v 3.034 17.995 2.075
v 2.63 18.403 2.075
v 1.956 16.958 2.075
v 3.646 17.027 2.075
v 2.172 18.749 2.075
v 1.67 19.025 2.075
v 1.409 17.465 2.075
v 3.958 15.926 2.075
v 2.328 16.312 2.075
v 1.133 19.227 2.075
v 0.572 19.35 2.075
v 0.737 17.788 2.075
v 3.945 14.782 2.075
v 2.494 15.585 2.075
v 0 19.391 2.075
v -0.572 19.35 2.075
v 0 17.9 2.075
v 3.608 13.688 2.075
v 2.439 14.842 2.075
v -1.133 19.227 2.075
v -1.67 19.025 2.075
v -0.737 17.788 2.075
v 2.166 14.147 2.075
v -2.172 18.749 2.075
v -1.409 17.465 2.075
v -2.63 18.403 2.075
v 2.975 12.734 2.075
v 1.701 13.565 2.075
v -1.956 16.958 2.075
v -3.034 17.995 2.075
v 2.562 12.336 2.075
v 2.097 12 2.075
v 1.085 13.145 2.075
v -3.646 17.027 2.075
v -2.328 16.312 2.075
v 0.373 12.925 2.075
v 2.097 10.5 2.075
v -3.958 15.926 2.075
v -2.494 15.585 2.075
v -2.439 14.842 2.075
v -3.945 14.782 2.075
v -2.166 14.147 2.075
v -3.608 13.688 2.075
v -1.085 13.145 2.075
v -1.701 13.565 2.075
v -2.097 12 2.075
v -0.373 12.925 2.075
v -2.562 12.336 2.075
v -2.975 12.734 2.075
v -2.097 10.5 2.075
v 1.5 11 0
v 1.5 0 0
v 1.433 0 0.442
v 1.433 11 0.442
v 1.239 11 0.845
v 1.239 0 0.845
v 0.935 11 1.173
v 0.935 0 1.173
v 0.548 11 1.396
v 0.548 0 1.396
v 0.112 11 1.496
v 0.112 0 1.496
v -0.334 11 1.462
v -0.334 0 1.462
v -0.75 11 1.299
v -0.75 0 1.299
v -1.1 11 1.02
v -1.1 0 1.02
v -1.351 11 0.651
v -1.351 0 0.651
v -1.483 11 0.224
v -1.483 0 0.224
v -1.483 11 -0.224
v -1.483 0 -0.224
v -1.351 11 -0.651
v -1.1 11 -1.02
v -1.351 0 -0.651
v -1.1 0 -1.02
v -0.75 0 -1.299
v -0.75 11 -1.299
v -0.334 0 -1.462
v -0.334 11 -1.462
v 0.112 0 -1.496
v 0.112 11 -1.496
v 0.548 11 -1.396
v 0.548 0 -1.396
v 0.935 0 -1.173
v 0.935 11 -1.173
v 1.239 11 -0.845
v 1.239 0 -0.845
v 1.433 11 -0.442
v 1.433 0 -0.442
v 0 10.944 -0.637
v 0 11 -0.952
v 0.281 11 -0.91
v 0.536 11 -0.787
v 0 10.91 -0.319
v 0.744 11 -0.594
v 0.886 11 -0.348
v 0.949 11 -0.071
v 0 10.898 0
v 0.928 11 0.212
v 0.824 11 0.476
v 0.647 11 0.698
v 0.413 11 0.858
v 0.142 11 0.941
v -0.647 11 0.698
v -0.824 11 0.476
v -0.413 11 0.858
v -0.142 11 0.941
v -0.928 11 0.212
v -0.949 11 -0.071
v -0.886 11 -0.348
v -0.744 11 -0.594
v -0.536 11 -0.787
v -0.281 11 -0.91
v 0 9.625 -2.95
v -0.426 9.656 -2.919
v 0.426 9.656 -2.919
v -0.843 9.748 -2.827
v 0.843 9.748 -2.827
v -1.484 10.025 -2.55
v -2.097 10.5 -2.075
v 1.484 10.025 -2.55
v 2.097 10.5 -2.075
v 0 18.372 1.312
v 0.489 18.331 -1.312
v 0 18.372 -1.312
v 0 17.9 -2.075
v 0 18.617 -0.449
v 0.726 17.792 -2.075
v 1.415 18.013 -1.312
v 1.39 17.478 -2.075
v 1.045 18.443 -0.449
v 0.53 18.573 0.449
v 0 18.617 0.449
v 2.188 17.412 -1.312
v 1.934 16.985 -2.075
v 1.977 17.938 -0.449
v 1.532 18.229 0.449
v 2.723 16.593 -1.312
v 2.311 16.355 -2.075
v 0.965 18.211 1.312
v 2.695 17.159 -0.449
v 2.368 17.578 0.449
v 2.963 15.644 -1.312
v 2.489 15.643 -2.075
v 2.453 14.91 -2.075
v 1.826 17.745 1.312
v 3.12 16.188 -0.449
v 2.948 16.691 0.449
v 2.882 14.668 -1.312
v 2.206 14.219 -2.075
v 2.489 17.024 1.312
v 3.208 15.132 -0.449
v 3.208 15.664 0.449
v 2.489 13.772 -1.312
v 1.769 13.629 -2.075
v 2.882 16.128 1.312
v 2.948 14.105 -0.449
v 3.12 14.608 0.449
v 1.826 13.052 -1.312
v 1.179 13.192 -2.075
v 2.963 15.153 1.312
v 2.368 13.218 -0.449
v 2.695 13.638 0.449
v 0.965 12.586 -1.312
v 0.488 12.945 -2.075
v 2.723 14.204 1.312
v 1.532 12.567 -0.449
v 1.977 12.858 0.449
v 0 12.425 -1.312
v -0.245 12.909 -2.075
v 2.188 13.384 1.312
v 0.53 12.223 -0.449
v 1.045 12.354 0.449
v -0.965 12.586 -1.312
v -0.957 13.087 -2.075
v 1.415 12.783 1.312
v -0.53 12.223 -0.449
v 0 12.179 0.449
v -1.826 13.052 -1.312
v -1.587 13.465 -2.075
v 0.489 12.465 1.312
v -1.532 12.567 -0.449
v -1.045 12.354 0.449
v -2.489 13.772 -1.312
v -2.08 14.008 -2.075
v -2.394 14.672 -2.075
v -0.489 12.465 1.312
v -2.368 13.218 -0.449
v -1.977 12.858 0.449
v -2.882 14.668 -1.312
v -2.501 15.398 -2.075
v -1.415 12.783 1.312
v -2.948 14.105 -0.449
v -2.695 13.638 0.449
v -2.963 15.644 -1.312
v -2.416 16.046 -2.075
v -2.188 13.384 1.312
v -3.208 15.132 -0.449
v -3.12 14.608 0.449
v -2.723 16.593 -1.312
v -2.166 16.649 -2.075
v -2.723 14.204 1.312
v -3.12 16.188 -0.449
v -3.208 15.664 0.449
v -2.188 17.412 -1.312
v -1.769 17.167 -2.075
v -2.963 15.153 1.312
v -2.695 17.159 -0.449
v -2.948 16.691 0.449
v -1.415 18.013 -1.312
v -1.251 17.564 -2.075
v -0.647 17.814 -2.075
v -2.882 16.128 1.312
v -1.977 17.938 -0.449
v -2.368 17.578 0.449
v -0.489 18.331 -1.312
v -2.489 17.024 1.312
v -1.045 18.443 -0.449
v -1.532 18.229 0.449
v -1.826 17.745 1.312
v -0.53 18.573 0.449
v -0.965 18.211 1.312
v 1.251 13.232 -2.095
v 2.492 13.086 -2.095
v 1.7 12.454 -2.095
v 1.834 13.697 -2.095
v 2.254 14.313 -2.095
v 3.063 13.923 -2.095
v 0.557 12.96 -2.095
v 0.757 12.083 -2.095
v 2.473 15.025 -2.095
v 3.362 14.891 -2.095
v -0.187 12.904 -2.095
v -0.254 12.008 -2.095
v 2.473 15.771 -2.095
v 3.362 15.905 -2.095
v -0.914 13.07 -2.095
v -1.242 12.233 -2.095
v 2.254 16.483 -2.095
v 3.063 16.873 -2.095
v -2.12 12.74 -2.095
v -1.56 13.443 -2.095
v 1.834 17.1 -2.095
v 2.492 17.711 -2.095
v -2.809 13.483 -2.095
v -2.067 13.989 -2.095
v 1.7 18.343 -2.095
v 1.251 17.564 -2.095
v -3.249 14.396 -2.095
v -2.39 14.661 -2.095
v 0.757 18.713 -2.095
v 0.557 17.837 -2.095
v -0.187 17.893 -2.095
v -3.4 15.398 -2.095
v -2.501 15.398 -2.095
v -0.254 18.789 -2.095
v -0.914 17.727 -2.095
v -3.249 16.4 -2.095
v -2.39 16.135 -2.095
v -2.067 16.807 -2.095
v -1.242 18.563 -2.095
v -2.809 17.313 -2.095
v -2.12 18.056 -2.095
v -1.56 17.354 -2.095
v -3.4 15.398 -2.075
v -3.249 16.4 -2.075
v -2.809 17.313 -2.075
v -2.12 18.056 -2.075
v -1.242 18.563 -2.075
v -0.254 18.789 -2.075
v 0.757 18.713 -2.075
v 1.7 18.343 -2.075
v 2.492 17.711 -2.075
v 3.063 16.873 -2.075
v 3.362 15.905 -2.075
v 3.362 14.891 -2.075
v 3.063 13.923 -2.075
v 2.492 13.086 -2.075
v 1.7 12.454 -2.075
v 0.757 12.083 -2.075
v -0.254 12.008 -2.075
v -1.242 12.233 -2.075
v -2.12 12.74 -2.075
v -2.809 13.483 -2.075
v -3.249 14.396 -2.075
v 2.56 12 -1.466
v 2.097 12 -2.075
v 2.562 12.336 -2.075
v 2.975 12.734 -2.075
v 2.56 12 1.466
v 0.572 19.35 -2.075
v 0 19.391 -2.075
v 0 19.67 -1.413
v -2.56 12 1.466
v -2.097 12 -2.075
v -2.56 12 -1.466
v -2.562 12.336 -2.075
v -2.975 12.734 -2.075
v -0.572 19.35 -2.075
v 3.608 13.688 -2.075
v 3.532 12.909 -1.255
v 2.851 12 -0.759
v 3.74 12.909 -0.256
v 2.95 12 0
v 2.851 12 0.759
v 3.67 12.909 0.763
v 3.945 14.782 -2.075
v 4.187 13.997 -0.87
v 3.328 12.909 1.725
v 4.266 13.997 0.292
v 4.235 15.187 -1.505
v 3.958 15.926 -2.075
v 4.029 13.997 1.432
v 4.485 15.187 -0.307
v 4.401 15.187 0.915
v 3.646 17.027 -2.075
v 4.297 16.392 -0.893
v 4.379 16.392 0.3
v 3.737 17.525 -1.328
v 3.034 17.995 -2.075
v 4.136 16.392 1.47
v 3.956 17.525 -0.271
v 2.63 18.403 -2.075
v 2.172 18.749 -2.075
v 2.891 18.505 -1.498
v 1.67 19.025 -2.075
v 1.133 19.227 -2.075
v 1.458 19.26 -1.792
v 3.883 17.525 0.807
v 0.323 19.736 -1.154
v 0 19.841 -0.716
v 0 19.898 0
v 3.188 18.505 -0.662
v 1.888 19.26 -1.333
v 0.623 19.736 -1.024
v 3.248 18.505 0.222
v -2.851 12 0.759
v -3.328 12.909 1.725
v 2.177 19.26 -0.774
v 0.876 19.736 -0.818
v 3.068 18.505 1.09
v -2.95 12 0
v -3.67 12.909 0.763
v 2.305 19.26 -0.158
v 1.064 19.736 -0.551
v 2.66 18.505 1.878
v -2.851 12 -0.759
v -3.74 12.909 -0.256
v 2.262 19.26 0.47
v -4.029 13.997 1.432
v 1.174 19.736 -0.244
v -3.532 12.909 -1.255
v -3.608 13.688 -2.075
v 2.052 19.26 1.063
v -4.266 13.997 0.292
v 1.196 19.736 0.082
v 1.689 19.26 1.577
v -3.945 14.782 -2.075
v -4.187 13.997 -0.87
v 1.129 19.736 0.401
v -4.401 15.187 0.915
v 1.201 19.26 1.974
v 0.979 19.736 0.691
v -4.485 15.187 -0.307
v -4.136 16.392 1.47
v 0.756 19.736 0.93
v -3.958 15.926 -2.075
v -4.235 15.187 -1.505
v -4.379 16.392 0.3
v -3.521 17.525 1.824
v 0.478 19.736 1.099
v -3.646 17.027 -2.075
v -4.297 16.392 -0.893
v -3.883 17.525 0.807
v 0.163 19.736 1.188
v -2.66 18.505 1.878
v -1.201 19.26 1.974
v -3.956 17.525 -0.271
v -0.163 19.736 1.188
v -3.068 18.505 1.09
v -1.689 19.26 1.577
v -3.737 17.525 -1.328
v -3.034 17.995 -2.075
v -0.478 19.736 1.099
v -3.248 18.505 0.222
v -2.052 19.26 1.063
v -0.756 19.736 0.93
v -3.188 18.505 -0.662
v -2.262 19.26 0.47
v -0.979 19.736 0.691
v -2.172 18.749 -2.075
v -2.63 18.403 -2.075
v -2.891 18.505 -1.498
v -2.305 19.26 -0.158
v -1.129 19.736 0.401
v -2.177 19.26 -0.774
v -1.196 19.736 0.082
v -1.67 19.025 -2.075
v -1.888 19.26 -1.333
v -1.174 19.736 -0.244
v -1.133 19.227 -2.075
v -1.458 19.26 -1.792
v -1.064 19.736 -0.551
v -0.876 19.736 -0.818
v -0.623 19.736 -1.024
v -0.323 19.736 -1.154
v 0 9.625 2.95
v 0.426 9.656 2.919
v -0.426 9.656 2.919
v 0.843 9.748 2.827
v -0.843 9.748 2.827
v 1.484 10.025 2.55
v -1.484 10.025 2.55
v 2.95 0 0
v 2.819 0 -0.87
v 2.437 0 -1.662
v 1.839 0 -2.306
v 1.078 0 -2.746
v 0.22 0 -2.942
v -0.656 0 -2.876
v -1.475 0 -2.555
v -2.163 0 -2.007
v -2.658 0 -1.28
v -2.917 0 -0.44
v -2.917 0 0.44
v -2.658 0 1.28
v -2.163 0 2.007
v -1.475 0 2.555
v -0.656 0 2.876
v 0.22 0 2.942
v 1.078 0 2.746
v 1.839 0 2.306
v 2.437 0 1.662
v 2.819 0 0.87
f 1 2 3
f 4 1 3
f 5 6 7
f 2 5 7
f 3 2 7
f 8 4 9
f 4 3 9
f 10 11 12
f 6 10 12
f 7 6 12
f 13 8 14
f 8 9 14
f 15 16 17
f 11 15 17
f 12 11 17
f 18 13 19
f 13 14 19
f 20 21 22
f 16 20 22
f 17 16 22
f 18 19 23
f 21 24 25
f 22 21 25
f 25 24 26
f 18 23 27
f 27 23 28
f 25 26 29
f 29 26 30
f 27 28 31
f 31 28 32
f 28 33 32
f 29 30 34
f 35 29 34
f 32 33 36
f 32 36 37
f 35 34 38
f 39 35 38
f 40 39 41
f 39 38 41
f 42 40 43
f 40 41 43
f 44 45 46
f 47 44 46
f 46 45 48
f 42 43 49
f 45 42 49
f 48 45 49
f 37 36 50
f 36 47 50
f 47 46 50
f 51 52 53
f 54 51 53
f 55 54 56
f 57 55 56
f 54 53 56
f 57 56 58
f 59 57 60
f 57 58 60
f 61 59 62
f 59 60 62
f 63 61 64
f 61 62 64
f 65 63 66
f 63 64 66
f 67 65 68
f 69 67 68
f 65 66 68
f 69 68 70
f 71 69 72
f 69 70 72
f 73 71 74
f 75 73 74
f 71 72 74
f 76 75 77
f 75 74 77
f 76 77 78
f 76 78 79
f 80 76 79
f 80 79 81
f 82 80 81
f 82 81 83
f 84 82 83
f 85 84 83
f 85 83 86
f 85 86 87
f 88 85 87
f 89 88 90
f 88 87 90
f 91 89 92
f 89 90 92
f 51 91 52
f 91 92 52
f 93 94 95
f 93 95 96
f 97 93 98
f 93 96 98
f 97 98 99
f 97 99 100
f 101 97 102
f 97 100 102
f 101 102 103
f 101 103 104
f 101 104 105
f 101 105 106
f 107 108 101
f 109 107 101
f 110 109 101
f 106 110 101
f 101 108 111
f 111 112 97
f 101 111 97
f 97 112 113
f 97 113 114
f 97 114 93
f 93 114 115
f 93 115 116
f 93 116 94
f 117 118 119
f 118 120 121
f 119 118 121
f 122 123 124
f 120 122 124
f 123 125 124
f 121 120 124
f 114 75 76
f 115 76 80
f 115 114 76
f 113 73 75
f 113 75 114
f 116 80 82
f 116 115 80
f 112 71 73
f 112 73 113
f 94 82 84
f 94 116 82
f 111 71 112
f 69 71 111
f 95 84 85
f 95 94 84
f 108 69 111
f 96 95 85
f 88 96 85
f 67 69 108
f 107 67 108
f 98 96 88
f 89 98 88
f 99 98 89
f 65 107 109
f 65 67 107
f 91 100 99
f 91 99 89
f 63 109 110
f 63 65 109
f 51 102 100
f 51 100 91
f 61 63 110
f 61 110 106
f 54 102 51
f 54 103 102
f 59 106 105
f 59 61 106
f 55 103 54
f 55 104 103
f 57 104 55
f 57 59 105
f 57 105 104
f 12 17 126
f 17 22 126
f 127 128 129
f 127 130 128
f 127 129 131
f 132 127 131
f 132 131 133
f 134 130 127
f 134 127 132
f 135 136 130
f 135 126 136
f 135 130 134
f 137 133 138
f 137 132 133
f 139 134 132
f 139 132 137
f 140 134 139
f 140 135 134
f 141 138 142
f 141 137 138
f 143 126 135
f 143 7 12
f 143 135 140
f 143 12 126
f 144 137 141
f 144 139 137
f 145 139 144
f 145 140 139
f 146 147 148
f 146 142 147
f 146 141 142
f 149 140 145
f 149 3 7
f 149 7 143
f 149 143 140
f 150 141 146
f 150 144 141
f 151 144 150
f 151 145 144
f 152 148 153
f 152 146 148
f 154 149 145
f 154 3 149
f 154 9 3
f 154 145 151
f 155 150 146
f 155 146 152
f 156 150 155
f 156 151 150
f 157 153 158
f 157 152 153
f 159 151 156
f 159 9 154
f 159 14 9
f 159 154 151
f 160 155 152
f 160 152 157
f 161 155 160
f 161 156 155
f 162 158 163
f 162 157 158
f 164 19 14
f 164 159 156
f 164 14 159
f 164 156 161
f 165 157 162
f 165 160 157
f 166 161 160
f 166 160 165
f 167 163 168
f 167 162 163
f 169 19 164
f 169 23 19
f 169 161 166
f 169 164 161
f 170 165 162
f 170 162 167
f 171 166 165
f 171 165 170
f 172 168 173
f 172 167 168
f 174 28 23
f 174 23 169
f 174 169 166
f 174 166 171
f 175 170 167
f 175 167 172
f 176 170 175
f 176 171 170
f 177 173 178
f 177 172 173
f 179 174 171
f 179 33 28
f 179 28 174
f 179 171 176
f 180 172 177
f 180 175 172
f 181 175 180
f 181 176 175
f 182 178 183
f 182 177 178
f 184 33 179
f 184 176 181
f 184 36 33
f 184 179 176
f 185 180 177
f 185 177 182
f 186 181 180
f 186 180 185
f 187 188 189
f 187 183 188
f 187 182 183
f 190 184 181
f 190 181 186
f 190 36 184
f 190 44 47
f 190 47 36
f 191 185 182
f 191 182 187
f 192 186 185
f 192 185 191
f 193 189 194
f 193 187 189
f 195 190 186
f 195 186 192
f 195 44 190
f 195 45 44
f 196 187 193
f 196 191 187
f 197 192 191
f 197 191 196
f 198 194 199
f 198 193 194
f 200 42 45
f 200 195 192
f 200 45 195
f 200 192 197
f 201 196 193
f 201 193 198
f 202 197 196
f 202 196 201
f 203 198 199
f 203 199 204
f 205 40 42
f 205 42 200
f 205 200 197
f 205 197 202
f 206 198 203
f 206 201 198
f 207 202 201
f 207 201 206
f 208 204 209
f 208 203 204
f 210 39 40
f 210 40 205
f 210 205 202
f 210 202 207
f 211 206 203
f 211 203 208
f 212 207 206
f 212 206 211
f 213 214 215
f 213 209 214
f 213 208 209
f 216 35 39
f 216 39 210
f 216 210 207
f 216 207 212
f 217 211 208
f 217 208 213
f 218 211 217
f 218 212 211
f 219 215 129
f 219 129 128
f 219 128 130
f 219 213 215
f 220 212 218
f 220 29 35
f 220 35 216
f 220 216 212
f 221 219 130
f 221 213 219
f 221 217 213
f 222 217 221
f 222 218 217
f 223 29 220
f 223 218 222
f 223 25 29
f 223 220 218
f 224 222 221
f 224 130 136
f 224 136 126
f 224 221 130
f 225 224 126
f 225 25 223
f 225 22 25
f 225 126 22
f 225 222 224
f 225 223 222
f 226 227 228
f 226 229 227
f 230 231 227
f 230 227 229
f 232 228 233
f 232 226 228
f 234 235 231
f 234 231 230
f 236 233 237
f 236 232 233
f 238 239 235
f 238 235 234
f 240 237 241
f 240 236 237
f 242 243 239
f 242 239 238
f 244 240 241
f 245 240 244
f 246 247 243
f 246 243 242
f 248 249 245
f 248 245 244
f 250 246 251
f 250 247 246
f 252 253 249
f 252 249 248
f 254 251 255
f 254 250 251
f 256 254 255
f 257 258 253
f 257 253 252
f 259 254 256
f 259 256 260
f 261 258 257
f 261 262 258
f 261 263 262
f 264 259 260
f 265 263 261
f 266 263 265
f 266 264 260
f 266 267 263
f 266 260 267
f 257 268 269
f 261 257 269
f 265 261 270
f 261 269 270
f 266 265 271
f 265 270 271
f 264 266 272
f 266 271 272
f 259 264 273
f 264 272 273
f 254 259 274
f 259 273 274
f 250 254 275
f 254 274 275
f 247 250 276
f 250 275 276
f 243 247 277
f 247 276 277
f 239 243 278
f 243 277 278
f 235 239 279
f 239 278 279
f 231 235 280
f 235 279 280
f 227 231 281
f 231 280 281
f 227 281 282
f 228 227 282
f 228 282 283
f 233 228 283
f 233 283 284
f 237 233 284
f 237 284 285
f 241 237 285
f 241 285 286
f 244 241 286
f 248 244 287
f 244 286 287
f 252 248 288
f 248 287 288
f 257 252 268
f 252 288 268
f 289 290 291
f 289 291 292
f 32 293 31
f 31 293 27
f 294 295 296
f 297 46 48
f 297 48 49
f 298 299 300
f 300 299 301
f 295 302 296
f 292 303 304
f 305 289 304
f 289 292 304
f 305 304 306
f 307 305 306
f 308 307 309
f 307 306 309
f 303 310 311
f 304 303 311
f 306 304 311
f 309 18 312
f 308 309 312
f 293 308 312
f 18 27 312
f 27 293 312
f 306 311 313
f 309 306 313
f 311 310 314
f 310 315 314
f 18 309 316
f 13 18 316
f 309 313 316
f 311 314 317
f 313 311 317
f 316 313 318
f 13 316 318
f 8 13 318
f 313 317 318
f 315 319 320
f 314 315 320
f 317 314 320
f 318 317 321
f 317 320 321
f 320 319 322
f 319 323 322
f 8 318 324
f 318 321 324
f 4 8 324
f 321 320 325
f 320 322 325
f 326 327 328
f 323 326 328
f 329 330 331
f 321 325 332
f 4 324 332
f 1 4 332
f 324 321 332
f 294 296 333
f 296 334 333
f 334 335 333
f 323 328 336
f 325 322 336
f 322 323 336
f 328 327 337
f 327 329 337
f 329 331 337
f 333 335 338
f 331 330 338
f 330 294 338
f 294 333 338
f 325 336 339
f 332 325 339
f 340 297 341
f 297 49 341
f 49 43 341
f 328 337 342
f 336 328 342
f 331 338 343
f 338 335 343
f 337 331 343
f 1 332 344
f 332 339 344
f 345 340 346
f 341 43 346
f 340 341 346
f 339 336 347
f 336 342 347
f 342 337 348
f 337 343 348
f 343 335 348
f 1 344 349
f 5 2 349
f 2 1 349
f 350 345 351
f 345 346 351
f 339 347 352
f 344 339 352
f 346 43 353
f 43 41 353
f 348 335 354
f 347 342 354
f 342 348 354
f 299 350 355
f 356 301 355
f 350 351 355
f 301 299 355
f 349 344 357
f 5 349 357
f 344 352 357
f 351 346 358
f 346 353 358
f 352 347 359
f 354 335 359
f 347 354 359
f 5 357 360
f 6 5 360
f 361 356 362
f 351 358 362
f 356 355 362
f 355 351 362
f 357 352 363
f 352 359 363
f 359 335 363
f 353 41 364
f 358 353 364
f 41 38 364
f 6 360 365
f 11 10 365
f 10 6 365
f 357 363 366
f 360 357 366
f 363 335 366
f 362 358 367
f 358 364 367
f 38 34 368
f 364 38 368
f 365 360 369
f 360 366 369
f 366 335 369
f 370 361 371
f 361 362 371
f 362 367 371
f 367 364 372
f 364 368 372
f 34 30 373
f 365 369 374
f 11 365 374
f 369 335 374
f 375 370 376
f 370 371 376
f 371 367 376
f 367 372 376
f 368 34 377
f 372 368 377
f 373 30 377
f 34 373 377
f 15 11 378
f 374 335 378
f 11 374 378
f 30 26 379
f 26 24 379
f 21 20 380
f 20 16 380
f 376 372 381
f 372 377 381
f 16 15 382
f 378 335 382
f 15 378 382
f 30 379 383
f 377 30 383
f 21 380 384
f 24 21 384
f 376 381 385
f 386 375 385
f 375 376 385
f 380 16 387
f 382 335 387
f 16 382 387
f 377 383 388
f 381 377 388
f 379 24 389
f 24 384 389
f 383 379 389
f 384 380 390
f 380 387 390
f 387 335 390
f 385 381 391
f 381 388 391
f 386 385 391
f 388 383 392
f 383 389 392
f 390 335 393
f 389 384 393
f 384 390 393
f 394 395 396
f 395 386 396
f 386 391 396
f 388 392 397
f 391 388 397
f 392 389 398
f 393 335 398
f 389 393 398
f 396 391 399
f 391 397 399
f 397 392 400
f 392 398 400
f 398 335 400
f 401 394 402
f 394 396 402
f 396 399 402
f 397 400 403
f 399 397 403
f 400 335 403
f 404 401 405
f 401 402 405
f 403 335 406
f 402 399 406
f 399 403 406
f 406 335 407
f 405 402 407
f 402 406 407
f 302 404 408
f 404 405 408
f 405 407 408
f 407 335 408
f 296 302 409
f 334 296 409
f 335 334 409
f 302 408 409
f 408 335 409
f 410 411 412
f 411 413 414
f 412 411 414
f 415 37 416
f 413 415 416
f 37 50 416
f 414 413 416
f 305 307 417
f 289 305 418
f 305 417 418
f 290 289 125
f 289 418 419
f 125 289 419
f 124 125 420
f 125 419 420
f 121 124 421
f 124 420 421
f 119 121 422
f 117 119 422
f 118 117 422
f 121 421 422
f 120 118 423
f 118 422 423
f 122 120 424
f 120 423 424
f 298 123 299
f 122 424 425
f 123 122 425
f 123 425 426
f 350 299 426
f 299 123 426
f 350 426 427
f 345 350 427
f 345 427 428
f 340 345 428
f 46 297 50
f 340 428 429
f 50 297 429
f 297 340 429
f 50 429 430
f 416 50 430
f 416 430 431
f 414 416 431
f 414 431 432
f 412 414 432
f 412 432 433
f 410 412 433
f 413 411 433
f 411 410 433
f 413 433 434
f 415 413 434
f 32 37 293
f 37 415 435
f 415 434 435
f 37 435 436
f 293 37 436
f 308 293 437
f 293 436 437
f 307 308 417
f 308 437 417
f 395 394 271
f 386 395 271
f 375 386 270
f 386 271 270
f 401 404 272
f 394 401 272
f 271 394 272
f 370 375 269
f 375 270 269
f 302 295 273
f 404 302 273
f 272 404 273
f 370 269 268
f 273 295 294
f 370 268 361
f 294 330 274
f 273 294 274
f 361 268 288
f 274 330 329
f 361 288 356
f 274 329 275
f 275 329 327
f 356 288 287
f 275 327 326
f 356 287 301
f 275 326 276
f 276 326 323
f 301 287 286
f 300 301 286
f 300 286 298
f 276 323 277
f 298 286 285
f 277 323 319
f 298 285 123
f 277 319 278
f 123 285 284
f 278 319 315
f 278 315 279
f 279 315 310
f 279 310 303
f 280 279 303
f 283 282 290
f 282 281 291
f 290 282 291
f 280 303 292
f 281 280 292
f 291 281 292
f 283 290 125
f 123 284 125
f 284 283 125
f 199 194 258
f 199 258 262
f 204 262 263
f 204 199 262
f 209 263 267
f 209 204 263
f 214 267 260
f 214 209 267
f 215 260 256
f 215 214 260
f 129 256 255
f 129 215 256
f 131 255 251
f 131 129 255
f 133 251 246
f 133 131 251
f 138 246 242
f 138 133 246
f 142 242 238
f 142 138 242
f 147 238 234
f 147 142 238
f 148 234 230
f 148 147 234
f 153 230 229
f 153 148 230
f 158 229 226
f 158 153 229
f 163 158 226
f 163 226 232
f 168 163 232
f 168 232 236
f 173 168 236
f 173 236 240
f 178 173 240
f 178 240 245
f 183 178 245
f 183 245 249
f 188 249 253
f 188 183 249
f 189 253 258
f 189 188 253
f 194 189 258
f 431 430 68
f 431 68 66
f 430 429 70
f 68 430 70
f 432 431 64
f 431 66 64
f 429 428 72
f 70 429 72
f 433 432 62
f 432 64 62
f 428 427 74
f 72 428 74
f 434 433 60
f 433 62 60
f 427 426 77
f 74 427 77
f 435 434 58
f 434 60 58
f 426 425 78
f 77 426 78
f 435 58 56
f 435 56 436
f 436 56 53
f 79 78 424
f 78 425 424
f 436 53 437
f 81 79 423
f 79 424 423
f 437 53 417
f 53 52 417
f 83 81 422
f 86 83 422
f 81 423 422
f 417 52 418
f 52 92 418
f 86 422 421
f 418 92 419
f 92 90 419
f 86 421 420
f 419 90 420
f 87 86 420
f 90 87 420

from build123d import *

# Parameters (mm, degrees)
SKETCH1_R               = 2.95
BOSS_EXTRUDE1_DEPTH     = 12
SKETCH5_R               = 1.5
CUT_EXTRUDE3_DEPTH      = 11
CUT_EXTRUDE4_DEPTH      = 5.5
CUT_EXTRUDE4_DEPTH_BACK = 5.5
SKETCH12_R              = 3.400000058
SKETCH12_R_2            = 2.501374622
BOSS_EXTRUDE5_DEPTH     = 0.02


with BuildPart() as part:
    # Sketch1 → Boss-Extrude1 (new body)
    with BuildSketch(Plane(origin=(0, 0, 0), x_dir=(1, 0, 0), z_dir=(0, 1, 0))):
        Circle(SKETCH1_R)
    extrude(amount=BOSS_EXTRUDE1_DEPTH)

    # Sketch5 → Cut-Extrude3 (cut)
    with BuildSketch(Plane.XZ):
        Circle(SKETCH5_R)
    extrude(amount=-CUT_EXTRUDE3_DEPTH, mode=Mode.SUBTRACT)

    # Sketch2 → Revolve3 (revolve)
    with BuildSketch(Plane(origin=(0, 0, 0), x_dir=(0, 0, -1), z_dir=(1, 0, 0))):
        with BuildLine():
            Line((0, 19.898161268), (0, 10.898161268))
            ThreePointArc((0, 10.898161268), (4.5, 15.398161268), (0, 19.898161268))
        make_face()
    revolve(axis=Axis((0, 12, 0), (0, -1, 0)))

    # Sketch8 → Cut-Extrude4 (cut, two sides)
    with BuildSketch(Plane(origin=(0, 0, 0), x_dir=(0, 0, -1), z_dir=(1, 0, 0))) as cut_extrude4_sk:
        Polygon((-2.075, 20.390789919), (-2.075, 10.5), (-5.08, 7.495), (-5.08, 20.390789919), align=None)
        Polygon((5.08, 20.390789919), (2.075, 20.390789919), (2.075, 10.5), (5.08, 7.495), align=None)
    extrude(amount=CUT_EXTRUDE4_DEPTH, mode=Mode.SUBTRACT)
    extrude(cut_extrude4_sk.sketch, amount=-CUT_EXTRUDE4_DEPTH_BACK, mode=Mode.SUBTRACT)

    # Sketch11 → Cut-Revolve2 (revolve, cut)
    with BuildSketch(Plane(origin=(0, 0, 0), x_dir=(0, 0, -1), z_dir=(1, 0, 0))):
        with BuildLine():
            Line((-3.25, 15.398161268), (3.25, 15.398161268))
            ThreePointArc((3.25, 15.398161268), (0, 18.648161268), (-3.25, 15.398161268))
        make_face()
    revolve(axis=Axis((0, 15.398161268, 2.075), (0, 0, -1)), mode=Mode.SUBTRACT)

    # Sketch12 → Boss-Extrude5 (add)
    with BuildSketch(Plane(origin=(0, 0, -2.075), x_dir=(-1, 0, 0), z_dir=(0, 0, -1))):
        with Locations((0, 15.398161268)):
            Circle(SKETCH12_R)
        with Locations((0, 15.398161268)):
            Circle(SKETCH12_R_2, mode=Mode.SUBTRACT)
    extrude(amount=BOSS_EXTRUDE5_DEPTH)


solid = part.part
